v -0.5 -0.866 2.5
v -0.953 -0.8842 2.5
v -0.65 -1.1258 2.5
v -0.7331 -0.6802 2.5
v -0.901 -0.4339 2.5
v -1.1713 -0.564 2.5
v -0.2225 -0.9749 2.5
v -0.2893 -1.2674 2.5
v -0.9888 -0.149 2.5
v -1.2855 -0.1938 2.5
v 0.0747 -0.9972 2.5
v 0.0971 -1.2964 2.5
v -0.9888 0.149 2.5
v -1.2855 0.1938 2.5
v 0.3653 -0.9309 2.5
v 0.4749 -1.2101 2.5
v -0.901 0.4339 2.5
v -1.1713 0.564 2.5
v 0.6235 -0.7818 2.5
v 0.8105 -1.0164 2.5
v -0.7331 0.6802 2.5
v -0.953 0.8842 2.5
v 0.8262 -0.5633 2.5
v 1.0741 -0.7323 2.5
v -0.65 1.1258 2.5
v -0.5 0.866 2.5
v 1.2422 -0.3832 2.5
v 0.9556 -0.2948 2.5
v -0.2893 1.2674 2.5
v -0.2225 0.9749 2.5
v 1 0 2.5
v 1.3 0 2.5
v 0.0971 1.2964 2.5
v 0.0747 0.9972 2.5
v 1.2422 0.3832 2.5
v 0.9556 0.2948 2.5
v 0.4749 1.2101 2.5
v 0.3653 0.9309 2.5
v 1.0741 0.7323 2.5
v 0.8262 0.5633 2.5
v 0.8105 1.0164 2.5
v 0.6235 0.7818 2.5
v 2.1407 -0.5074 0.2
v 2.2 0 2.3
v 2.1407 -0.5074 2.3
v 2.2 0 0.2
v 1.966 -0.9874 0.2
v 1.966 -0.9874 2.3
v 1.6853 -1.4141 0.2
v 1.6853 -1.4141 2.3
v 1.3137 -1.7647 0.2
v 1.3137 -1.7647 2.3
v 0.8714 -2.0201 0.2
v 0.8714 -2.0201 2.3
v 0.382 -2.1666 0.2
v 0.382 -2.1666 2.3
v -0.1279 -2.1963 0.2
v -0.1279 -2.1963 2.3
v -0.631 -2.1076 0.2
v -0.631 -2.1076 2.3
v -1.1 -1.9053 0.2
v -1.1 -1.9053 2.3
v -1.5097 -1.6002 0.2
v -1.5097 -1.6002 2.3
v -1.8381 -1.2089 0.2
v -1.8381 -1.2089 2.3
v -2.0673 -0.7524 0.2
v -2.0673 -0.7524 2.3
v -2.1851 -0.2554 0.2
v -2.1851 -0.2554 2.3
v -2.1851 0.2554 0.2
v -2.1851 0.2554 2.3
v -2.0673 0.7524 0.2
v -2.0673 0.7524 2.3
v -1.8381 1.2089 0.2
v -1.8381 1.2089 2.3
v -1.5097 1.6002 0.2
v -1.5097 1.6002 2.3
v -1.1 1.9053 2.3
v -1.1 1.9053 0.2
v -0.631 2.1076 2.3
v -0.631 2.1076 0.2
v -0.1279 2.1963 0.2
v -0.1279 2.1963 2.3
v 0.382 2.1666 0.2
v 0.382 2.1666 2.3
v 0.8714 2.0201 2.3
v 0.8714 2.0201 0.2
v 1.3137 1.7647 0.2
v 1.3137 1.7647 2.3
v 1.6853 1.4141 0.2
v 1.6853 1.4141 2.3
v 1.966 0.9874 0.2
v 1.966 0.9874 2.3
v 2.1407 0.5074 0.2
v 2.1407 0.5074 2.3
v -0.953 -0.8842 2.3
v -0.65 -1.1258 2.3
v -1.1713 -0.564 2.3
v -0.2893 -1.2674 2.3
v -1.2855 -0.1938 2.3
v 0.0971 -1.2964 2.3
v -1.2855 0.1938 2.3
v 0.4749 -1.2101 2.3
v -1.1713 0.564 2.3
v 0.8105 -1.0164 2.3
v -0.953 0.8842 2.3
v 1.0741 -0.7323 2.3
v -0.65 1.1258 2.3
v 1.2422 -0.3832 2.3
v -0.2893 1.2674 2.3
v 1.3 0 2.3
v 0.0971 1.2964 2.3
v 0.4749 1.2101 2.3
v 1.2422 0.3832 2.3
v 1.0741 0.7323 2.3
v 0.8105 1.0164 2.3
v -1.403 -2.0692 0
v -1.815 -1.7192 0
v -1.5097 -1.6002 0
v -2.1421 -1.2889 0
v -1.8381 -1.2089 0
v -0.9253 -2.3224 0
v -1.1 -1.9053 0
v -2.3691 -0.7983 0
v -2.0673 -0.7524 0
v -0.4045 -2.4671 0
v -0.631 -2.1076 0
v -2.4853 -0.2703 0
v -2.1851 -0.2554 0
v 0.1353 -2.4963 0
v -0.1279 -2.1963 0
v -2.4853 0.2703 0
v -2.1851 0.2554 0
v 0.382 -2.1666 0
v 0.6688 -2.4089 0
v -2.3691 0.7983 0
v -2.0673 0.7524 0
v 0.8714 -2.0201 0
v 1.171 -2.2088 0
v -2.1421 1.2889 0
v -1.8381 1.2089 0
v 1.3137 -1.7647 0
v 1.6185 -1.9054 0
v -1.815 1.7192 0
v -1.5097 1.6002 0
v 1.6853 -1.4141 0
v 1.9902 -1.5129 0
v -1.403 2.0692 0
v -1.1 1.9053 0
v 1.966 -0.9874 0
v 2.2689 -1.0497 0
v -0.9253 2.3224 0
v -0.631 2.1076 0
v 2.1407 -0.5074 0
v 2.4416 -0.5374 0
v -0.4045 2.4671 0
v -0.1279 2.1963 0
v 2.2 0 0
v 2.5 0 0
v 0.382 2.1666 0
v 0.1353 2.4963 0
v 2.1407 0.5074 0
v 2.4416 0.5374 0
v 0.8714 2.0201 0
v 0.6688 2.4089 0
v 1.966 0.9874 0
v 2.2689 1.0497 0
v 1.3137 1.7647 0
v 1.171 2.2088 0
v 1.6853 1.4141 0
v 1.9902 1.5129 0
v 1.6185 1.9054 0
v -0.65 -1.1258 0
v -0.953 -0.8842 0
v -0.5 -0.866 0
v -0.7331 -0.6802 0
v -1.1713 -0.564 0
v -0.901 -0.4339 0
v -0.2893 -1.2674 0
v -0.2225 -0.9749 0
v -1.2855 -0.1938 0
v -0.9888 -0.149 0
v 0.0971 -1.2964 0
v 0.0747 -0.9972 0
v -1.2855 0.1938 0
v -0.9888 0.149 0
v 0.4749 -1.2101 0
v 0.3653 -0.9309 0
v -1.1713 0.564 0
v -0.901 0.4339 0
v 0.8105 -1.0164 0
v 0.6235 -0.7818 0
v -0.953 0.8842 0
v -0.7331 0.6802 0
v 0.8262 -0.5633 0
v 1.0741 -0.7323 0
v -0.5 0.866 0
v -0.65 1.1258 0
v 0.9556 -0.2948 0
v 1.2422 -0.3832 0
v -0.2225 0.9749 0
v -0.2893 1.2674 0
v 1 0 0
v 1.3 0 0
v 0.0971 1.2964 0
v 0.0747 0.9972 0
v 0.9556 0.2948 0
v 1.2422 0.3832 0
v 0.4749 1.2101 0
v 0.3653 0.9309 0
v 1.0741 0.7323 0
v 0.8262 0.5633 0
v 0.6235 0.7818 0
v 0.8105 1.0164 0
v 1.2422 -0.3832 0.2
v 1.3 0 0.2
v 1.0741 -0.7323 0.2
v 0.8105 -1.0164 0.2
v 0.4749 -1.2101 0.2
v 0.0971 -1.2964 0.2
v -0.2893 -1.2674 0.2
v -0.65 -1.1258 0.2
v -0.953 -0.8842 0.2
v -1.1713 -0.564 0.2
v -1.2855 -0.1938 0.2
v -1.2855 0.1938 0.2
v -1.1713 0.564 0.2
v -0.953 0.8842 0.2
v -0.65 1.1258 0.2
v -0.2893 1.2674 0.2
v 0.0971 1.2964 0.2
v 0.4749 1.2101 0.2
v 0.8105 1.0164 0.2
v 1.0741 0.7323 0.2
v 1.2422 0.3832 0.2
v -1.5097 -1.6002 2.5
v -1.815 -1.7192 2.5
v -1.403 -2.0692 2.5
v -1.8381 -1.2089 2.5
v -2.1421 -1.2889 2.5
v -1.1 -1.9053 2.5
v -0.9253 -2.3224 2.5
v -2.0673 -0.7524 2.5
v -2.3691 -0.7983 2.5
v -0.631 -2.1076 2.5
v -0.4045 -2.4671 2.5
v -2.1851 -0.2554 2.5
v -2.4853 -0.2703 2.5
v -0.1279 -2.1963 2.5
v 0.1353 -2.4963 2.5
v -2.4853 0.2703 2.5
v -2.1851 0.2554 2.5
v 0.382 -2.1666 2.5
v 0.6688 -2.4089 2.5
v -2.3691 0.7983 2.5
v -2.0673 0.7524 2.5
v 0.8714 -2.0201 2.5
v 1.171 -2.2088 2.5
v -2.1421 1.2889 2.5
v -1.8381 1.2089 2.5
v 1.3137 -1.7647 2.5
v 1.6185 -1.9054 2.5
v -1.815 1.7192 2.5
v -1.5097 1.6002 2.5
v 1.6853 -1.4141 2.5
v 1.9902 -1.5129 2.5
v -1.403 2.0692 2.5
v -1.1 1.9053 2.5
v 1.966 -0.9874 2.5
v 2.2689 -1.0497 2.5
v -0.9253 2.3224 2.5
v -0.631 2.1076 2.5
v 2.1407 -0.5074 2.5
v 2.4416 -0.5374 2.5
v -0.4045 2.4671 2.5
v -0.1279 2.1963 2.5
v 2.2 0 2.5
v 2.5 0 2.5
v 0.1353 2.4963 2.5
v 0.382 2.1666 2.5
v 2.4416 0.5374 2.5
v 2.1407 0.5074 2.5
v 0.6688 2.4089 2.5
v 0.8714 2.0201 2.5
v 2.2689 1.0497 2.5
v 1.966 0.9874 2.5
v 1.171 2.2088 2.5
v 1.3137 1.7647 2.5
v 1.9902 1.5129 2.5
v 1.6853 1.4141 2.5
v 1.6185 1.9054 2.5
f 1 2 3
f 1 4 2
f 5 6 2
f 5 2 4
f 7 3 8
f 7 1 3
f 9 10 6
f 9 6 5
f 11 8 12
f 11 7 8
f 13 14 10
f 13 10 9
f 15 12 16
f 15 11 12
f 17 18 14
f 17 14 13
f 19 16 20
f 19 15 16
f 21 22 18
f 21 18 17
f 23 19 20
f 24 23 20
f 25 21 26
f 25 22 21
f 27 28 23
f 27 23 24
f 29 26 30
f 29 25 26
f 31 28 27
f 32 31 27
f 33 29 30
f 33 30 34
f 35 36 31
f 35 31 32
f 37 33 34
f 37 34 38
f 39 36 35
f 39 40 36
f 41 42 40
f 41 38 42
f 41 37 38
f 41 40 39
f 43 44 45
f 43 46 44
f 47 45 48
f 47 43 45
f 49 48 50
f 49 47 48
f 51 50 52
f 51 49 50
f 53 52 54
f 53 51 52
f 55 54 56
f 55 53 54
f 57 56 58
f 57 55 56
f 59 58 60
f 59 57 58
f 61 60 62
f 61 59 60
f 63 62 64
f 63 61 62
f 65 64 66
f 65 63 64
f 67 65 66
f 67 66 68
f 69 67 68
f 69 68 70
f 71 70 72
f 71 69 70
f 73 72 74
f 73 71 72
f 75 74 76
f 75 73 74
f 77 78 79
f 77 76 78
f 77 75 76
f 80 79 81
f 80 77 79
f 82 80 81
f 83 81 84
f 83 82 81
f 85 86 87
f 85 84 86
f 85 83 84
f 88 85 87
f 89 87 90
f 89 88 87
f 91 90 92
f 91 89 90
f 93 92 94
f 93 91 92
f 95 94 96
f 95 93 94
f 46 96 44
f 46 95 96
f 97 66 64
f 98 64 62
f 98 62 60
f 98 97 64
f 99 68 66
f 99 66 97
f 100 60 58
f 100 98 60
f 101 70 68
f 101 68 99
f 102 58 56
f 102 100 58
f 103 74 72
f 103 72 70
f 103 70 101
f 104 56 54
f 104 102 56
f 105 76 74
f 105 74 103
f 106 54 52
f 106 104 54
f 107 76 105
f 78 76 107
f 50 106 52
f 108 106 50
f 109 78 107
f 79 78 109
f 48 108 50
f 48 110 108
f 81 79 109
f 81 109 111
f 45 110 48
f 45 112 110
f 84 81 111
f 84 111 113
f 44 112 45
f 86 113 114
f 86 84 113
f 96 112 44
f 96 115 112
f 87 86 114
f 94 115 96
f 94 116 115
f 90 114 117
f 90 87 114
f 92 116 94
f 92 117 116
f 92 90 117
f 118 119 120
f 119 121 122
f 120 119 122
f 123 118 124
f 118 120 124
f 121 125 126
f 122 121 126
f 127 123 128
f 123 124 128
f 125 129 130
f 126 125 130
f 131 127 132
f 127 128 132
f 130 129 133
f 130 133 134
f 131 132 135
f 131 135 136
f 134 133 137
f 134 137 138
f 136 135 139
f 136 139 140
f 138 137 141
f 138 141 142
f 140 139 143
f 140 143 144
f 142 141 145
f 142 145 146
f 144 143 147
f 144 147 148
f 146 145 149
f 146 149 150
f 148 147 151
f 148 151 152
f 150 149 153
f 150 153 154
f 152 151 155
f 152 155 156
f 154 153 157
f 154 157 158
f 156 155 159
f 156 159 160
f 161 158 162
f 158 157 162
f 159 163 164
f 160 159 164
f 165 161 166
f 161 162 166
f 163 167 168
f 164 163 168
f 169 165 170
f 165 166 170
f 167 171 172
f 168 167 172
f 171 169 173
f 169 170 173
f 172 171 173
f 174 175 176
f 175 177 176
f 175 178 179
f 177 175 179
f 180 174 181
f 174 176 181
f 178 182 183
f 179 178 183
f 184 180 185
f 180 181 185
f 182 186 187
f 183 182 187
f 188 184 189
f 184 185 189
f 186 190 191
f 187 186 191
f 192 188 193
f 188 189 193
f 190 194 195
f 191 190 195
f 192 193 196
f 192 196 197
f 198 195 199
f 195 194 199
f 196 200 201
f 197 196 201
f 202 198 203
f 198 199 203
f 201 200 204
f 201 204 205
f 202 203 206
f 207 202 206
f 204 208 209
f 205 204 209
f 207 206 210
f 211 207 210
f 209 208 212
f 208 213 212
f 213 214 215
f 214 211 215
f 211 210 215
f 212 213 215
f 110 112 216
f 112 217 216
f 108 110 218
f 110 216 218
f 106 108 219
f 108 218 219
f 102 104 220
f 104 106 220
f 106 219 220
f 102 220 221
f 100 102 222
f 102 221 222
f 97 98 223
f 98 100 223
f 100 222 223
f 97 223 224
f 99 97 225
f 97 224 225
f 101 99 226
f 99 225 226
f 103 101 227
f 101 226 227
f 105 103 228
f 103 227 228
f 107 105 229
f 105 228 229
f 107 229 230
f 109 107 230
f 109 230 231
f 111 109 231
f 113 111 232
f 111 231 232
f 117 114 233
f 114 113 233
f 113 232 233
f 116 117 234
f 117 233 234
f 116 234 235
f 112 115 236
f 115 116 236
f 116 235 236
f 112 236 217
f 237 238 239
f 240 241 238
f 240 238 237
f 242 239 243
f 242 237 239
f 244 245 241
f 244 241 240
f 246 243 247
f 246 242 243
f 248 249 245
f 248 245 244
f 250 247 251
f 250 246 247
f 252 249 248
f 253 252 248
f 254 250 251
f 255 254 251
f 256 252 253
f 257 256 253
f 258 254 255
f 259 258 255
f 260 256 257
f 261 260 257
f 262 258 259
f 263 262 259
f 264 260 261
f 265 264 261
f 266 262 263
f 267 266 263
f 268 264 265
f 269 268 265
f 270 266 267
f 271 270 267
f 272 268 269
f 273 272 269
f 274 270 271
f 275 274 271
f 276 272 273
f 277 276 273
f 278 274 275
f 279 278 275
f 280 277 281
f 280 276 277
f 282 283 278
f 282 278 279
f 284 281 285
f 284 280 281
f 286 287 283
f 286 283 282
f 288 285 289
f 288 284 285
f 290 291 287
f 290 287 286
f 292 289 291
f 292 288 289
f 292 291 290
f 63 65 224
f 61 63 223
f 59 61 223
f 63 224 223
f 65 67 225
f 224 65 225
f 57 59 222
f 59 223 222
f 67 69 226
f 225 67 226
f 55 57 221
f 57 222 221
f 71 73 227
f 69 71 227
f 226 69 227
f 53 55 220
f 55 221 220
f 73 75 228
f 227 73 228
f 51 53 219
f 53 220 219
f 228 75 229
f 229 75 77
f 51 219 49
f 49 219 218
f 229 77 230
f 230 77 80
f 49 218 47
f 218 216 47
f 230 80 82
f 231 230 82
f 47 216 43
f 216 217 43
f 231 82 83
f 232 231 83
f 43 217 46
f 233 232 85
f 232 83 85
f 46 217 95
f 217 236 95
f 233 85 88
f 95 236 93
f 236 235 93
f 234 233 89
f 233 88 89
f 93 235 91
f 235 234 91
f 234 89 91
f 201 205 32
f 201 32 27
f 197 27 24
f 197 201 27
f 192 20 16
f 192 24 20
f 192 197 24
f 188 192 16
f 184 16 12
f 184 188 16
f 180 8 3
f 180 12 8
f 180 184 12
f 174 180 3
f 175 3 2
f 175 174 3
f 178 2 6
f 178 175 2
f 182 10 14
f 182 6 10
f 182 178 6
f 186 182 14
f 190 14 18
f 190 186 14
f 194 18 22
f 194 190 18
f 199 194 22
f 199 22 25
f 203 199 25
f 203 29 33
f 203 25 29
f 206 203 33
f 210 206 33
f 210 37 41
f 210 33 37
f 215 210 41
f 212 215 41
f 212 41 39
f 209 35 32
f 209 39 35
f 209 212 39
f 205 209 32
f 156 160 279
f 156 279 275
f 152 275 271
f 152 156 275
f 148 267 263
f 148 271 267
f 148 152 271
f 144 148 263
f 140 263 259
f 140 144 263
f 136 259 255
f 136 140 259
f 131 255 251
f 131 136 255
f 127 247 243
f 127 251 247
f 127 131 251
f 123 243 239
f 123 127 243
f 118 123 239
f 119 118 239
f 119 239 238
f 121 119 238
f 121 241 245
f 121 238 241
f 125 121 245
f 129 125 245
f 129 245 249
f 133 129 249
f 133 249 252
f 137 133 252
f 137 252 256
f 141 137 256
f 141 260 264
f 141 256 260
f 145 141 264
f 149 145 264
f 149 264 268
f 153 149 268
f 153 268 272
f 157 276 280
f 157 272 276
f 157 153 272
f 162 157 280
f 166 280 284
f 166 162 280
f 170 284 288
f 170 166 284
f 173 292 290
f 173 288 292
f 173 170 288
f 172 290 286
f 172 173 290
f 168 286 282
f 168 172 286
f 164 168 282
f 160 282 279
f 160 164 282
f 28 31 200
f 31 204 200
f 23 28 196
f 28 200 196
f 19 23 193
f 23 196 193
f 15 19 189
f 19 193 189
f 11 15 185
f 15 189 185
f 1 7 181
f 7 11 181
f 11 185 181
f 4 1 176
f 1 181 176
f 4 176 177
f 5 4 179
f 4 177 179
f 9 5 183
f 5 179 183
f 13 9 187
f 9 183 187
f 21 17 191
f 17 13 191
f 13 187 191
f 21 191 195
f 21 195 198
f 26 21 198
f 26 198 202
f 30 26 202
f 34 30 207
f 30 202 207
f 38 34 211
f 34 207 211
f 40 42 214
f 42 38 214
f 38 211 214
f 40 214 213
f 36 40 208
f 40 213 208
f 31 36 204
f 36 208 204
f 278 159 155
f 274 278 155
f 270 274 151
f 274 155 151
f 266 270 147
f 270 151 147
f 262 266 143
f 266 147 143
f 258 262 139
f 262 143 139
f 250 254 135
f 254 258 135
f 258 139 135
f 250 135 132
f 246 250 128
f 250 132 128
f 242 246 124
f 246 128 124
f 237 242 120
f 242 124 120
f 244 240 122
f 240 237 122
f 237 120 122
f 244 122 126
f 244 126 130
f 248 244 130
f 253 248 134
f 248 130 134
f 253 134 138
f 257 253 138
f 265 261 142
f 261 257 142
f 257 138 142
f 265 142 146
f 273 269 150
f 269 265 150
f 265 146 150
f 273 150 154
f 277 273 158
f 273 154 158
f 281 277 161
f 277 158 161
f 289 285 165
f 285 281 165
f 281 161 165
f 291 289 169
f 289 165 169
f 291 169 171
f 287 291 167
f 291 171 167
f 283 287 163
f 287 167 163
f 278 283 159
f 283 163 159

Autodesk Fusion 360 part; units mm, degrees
sketch "スケッチ1" plane through (0, 0, 0) normal (0, 0, 1) x (1, 0, 0)
  circle A0 centre (0, 0) radius 2.5
  circle A1 centre (0, 0) radius 2.2
  circle A2 centre (0, 0) radius 1.3
  circle A3 centre (0, 0) radius 1
  dimension "d1" = 5
  dimension "d2" = 2
  dimension "d3" = 2.6
  dimension "d4" = 4.4
extrude "押し出し1" add sketch "スケッチ1" along normal blind 2.5 contours A0 makes body 1
extrude "押し出し2" add sketch "スケッチ1" along normal blind 2.1 from surface at 0.2 separate body contours A1 makes body 2
extrude "押し出し1'" add sketch "スケッチ1" along normal blind 2.5 separate body contours A2 makes body 3 in component "Component"
component "Component" placed x (1, 0, 0) y (0, 1, 0) z (0, 0, 1) at (0, 0, 0)
